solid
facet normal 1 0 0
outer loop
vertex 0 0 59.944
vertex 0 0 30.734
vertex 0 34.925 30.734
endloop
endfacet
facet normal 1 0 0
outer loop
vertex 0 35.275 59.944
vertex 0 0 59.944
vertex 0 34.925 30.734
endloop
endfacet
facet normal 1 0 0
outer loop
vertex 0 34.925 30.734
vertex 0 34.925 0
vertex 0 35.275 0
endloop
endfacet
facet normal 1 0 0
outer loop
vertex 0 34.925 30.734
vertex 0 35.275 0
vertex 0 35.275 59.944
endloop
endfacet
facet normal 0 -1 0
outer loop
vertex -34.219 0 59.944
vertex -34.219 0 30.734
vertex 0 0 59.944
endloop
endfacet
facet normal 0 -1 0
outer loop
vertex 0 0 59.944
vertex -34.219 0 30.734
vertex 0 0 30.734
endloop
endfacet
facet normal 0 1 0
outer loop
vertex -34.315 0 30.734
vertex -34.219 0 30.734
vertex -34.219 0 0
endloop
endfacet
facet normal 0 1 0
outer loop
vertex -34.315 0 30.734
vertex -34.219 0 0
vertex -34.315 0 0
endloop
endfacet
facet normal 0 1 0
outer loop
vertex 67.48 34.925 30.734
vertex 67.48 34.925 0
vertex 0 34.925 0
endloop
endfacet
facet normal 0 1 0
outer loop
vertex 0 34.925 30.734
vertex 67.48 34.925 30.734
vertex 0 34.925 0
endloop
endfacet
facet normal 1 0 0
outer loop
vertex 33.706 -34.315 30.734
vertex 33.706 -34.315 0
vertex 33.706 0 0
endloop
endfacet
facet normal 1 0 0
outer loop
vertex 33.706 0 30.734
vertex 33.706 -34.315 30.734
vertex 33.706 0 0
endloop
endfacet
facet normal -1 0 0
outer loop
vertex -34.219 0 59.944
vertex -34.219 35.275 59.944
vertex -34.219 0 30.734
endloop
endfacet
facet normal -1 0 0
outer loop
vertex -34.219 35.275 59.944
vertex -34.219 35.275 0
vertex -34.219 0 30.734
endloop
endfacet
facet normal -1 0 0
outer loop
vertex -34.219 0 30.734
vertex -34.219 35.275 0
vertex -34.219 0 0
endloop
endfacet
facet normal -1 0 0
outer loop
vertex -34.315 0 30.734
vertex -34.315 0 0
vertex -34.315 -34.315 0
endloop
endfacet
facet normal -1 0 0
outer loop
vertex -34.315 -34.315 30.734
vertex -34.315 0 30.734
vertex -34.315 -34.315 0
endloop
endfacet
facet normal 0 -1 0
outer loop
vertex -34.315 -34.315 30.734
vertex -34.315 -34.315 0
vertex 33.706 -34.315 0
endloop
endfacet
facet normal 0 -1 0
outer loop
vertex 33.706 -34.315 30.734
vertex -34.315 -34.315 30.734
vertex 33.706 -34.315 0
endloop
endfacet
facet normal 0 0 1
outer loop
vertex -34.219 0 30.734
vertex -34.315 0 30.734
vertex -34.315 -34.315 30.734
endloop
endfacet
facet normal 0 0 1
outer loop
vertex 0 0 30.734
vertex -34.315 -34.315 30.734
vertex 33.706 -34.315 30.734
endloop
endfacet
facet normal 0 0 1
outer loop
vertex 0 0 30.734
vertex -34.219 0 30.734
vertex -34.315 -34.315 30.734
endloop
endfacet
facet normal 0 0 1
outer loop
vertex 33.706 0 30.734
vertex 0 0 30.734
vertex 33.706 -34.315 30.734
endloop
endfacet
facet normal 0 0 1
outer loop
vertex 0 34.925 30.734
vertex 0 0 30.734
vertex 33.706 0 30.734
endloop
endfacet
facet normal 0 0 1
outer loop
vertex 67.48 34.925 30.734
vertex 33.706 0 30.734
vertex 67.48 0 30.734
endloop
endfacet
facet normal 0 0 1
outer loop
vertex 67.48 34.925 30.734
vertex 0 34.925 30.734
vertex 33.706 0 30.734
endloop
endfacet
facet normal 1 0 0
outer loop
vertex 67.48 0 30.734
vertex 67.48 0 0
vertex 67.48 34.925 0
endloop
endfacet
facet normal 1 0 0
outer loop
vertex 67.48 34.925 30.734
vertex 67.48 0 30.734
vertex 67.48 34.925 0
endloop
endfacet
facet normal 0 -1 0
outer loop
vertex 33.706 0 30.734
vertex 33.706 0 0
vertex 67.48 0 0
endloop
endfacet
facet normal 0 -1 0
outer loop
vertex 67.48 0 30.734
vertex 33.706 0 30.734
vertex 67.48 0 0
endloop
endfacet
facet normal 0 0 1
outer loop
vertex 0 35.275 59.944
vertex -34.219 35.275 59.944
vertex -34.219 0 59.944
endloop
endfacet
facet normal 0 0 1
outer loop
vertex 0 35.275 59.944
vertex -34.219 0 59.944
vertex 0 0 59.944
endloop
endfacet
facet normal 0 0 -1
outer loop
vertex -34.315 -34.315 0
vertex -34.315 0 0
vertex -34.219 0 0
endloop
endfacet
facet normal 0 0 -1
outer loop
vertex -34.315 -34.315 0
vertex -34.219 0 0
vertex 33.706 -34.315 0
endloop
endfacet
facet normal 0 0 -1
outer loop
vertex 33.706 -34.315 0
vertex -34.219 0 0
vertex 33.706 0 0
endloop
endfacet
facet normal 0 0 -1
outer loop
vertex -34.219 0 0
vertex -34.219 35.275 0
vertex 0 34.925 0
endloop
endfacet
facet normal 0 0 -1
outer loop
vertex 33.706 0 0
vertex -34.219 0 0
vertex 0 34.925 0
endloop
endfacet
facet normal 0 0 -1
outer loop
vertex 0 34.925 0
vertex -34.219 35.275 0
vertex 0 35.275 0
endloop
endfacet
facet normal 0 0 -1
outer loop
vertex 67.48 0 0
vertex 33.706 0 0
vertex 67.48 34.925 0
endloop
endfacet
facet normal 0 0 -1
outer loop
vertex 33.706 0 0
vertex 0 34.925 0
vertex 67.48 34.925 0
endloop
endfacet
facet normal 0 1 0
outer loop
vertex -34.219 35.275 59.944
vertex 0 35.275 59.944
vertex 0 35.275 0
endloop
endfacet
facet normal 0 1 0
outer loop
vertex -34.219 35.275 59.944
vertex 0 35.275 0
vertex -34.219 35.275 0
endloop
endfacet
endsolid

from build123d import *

# Parameters (mm, degrees)
F0_W     = 45.4592518508
F0_H     = 59.5056191087
F0_W_2   = 45.7147136331
F0_H_2   = 116.1159910262
F1_DEPTH = 38.608
F2_W     = 45.6728860736
F2_H     = 59.5056191087
F3_DEPTH = 35.306
F5_W     = 33.7057895958
F5_H     = 34.315392375
F5_H_2   = 34.9249877036
F5_W_2   = 33.7739177048
F6_DEPTH = 30.734
F8_DEPTH = 29.21


with BuildPart() as f1:
    # F0 (on Top) → F1 (new body)
    with BuildSketch(Plane.XY):
        Polygon((-27.5232736021, 56.6103719175), (-77.1979466081, 56.6103719175), (-77.1979466081, -59.5056191087), (-27.5232736021, -59.5056191087), (-27.5232736021, 0), align=None)
        with Locations((-4.7936476767, -29.7528095543)):
            Rectangle(F0_W, F0_H)
        with Locations((-100.0553034246, -1.4476235956)):
            Rectangle(F0_W_2, F0_H_2)
    extrude(amount=F1_DEPTH)

    # F2 (on face) → F3 (join)
    with BuildSketch(Plane.XY.offset(38.608)):
        with Locations((-100.0762172043, -29.7528095543)):
            Rectangle(F2_W, F2_H)
    extrude(amount=F3_DEPTH)


with BuildPart() as f6:
    # F5 (on Top) → F6 (new body)
    with BuildSketch(Plane.XY):
        Polygon((-34.2192724347, 0), (0, 0), (0, 34.9249877036), (0, 35.2751240134), (-34.2192724347, 35.2751240134), align=None)
        Polygon((0, -34.315392375), (0, 0), (-34.2192724347, 0), (-34.315392375, 0), (-34.315392375, -34.315392375), align=None)
        with Locations((16.8528947979, -17.1576961875)):
            Rectangle(F5_W, F5_H)
        with Locations((16.8528947979, 17.4624938518)):
            Rectangle(F5_W, F5_H_2)
        with Locations((50.5927484483, 17.4624938518)):
            Rectangle(F5_W_2, F5_H_2)
    extrude(amount=F6_DEPTH)

    # F7 (on face) → F8 (join)
    with BuildSketch(Plane.XY.offset(30.734)):
        Polygon((0, 35.2751240134), (-34.2192724347, 35.2751240134), (-34.2192724347, 0), (0, 0), (0, 34.9249877036), align=None)
    extrude(amount=F8_DEPTH)


solid = f6.part
